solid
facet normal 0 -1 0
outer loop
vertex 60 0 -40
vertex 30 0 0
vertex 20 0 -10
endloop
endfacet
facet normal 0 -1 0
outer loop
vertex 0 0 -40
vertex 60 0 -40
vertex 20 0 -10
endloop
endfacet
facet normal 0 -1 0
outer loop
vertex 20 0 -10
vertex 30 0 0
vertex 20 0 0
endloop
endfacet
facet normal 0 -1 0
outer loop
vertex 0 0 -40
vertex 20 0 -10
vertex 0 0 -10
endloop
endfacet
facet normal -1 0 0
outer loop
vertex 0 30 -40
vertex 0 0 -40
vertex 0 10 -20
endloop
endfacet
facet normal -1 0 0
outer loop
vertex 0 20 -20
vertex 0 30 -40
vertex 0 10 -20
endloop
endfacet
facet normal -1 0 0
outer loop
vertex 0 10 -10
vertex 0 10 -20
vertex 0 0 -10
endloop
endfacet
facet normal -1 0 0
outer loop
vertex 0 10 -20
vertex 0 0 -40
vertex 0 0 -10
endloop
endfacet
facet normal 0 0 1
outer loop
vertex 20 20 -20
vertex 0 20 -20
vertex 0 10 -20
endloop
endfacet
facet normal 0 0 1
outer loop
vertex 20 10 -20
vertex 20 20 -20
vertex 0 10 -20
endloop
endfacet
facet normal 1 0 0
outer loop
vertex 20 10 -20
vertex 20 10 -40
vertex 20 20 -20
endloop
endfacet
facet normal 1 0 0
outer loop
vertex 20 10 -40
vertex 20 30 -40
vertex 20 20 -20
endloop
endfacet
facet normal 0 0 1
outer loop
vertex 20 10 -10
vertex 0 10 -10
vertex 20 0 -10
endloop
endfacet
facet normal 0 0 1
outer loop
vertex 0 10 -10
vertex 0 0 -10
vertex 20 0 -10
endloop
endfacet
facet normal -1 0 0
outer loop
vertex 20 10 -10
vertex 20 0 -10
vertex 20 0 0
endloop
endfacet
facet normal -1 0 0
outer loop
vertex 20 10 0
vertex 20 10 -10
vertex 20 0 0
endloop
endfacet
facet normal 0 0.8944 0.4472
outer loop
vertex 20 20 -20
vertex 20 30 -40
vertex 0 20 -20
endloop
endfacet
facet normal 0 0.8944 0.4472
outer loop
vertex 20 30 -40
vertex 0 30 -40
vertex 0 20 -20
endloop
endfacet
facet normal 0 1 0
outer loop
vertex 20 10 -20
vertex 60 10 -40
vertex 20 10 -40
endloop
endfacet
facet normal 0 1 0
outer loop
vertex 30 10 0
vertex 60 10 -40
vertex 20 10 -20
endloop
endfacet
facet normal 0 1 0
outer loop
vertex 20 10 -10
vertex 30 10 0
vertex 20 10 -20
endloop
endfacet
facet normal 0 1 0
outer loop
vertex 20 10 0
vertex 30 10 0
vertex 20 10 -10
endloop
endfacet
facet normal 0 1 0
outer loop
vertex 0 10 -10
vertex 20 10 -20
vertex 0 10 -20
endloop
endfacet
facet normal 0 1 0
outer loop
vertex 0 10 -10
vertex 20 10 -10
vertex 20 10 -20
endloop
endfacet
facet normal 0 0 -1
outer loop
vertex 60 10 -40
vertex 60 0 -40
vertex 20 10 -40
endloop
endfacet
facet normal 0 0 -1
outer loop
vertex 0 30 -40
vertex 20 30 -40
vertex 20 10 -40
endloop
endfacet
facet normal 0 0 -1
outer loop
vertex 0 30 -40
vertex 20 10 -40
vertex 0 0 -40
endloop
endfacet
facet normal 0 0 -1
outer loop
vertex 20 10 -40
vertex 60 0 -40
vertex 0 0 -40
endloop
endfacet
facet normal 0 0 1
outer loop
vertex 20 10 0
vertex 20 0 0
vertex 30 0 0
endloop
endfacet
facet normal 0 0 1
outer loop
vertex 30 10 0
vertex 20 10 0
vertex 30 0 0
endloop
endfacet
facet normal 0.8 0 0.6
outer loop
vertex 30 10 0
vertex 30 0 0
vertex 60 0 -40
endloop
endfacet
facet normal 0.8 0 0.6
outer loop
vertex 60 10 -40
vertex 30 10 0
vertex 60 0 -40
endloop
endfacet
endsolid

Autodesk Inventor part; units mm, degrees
ref_plane "YZ Plane" through (0, 0, 0) normal (1, 0, 0) x (0, 1, 0)
ref_plane "XZ Plane" through (0, 0, 0) normal (0, 1, 0) x (-1, 0, 0)
ref_plane "XY Plane" through (0, 0, 0) normal (0, 0, 1) x (1, 0, 0)
sketch "草圖1" plane through (0, 0, 0) normal (0, 1, 0) x (-1, 0, 0)
  line L0 (0, -10) -> (-20, -10)
  line L1 (-20, -10) -> (-20, 0)
  line L2 (-20, 0) -> (-30, 0)
  line L3 (-30, 0) -> (-60, -40)
  line L4 (-60, -40) -> (0, -40)
  line L5 (0, -40) -> (0, -10)
  point P0 (0, 0)
  dimension "d0" = 10
  dimension "d1" = 20
  dimension "d2" = 10
  dimension "d3" = 0
  dimension "d4" = 10
  dimension "d5" = 30
  dimension "d6" = 60
extrude "擠出1" add sketch "草圖1" along normal blind 10
sketch "草圖2" plane through (0, 0, -40) normal (-1, 0, 0) x (0, 0, 1)
  line L0 (40, 10) -> (0, 10) projected
  line L1 (0, 10) -> (0, 30)
  line L2 (0, 30) -> (20, 20)
  line L3 (20, 20) -> (20, 10)
  line L4 (20, 10) -> (0, 10)
  point P0 (40, 0)
  dimension "d9" = 20
  dimension "d10" = 20
  dimension "d11" = 10
extrude "擠出2" add sketch "草圖2" against normal blind 20
properties part number "43 (22000.000 mm^3)"
